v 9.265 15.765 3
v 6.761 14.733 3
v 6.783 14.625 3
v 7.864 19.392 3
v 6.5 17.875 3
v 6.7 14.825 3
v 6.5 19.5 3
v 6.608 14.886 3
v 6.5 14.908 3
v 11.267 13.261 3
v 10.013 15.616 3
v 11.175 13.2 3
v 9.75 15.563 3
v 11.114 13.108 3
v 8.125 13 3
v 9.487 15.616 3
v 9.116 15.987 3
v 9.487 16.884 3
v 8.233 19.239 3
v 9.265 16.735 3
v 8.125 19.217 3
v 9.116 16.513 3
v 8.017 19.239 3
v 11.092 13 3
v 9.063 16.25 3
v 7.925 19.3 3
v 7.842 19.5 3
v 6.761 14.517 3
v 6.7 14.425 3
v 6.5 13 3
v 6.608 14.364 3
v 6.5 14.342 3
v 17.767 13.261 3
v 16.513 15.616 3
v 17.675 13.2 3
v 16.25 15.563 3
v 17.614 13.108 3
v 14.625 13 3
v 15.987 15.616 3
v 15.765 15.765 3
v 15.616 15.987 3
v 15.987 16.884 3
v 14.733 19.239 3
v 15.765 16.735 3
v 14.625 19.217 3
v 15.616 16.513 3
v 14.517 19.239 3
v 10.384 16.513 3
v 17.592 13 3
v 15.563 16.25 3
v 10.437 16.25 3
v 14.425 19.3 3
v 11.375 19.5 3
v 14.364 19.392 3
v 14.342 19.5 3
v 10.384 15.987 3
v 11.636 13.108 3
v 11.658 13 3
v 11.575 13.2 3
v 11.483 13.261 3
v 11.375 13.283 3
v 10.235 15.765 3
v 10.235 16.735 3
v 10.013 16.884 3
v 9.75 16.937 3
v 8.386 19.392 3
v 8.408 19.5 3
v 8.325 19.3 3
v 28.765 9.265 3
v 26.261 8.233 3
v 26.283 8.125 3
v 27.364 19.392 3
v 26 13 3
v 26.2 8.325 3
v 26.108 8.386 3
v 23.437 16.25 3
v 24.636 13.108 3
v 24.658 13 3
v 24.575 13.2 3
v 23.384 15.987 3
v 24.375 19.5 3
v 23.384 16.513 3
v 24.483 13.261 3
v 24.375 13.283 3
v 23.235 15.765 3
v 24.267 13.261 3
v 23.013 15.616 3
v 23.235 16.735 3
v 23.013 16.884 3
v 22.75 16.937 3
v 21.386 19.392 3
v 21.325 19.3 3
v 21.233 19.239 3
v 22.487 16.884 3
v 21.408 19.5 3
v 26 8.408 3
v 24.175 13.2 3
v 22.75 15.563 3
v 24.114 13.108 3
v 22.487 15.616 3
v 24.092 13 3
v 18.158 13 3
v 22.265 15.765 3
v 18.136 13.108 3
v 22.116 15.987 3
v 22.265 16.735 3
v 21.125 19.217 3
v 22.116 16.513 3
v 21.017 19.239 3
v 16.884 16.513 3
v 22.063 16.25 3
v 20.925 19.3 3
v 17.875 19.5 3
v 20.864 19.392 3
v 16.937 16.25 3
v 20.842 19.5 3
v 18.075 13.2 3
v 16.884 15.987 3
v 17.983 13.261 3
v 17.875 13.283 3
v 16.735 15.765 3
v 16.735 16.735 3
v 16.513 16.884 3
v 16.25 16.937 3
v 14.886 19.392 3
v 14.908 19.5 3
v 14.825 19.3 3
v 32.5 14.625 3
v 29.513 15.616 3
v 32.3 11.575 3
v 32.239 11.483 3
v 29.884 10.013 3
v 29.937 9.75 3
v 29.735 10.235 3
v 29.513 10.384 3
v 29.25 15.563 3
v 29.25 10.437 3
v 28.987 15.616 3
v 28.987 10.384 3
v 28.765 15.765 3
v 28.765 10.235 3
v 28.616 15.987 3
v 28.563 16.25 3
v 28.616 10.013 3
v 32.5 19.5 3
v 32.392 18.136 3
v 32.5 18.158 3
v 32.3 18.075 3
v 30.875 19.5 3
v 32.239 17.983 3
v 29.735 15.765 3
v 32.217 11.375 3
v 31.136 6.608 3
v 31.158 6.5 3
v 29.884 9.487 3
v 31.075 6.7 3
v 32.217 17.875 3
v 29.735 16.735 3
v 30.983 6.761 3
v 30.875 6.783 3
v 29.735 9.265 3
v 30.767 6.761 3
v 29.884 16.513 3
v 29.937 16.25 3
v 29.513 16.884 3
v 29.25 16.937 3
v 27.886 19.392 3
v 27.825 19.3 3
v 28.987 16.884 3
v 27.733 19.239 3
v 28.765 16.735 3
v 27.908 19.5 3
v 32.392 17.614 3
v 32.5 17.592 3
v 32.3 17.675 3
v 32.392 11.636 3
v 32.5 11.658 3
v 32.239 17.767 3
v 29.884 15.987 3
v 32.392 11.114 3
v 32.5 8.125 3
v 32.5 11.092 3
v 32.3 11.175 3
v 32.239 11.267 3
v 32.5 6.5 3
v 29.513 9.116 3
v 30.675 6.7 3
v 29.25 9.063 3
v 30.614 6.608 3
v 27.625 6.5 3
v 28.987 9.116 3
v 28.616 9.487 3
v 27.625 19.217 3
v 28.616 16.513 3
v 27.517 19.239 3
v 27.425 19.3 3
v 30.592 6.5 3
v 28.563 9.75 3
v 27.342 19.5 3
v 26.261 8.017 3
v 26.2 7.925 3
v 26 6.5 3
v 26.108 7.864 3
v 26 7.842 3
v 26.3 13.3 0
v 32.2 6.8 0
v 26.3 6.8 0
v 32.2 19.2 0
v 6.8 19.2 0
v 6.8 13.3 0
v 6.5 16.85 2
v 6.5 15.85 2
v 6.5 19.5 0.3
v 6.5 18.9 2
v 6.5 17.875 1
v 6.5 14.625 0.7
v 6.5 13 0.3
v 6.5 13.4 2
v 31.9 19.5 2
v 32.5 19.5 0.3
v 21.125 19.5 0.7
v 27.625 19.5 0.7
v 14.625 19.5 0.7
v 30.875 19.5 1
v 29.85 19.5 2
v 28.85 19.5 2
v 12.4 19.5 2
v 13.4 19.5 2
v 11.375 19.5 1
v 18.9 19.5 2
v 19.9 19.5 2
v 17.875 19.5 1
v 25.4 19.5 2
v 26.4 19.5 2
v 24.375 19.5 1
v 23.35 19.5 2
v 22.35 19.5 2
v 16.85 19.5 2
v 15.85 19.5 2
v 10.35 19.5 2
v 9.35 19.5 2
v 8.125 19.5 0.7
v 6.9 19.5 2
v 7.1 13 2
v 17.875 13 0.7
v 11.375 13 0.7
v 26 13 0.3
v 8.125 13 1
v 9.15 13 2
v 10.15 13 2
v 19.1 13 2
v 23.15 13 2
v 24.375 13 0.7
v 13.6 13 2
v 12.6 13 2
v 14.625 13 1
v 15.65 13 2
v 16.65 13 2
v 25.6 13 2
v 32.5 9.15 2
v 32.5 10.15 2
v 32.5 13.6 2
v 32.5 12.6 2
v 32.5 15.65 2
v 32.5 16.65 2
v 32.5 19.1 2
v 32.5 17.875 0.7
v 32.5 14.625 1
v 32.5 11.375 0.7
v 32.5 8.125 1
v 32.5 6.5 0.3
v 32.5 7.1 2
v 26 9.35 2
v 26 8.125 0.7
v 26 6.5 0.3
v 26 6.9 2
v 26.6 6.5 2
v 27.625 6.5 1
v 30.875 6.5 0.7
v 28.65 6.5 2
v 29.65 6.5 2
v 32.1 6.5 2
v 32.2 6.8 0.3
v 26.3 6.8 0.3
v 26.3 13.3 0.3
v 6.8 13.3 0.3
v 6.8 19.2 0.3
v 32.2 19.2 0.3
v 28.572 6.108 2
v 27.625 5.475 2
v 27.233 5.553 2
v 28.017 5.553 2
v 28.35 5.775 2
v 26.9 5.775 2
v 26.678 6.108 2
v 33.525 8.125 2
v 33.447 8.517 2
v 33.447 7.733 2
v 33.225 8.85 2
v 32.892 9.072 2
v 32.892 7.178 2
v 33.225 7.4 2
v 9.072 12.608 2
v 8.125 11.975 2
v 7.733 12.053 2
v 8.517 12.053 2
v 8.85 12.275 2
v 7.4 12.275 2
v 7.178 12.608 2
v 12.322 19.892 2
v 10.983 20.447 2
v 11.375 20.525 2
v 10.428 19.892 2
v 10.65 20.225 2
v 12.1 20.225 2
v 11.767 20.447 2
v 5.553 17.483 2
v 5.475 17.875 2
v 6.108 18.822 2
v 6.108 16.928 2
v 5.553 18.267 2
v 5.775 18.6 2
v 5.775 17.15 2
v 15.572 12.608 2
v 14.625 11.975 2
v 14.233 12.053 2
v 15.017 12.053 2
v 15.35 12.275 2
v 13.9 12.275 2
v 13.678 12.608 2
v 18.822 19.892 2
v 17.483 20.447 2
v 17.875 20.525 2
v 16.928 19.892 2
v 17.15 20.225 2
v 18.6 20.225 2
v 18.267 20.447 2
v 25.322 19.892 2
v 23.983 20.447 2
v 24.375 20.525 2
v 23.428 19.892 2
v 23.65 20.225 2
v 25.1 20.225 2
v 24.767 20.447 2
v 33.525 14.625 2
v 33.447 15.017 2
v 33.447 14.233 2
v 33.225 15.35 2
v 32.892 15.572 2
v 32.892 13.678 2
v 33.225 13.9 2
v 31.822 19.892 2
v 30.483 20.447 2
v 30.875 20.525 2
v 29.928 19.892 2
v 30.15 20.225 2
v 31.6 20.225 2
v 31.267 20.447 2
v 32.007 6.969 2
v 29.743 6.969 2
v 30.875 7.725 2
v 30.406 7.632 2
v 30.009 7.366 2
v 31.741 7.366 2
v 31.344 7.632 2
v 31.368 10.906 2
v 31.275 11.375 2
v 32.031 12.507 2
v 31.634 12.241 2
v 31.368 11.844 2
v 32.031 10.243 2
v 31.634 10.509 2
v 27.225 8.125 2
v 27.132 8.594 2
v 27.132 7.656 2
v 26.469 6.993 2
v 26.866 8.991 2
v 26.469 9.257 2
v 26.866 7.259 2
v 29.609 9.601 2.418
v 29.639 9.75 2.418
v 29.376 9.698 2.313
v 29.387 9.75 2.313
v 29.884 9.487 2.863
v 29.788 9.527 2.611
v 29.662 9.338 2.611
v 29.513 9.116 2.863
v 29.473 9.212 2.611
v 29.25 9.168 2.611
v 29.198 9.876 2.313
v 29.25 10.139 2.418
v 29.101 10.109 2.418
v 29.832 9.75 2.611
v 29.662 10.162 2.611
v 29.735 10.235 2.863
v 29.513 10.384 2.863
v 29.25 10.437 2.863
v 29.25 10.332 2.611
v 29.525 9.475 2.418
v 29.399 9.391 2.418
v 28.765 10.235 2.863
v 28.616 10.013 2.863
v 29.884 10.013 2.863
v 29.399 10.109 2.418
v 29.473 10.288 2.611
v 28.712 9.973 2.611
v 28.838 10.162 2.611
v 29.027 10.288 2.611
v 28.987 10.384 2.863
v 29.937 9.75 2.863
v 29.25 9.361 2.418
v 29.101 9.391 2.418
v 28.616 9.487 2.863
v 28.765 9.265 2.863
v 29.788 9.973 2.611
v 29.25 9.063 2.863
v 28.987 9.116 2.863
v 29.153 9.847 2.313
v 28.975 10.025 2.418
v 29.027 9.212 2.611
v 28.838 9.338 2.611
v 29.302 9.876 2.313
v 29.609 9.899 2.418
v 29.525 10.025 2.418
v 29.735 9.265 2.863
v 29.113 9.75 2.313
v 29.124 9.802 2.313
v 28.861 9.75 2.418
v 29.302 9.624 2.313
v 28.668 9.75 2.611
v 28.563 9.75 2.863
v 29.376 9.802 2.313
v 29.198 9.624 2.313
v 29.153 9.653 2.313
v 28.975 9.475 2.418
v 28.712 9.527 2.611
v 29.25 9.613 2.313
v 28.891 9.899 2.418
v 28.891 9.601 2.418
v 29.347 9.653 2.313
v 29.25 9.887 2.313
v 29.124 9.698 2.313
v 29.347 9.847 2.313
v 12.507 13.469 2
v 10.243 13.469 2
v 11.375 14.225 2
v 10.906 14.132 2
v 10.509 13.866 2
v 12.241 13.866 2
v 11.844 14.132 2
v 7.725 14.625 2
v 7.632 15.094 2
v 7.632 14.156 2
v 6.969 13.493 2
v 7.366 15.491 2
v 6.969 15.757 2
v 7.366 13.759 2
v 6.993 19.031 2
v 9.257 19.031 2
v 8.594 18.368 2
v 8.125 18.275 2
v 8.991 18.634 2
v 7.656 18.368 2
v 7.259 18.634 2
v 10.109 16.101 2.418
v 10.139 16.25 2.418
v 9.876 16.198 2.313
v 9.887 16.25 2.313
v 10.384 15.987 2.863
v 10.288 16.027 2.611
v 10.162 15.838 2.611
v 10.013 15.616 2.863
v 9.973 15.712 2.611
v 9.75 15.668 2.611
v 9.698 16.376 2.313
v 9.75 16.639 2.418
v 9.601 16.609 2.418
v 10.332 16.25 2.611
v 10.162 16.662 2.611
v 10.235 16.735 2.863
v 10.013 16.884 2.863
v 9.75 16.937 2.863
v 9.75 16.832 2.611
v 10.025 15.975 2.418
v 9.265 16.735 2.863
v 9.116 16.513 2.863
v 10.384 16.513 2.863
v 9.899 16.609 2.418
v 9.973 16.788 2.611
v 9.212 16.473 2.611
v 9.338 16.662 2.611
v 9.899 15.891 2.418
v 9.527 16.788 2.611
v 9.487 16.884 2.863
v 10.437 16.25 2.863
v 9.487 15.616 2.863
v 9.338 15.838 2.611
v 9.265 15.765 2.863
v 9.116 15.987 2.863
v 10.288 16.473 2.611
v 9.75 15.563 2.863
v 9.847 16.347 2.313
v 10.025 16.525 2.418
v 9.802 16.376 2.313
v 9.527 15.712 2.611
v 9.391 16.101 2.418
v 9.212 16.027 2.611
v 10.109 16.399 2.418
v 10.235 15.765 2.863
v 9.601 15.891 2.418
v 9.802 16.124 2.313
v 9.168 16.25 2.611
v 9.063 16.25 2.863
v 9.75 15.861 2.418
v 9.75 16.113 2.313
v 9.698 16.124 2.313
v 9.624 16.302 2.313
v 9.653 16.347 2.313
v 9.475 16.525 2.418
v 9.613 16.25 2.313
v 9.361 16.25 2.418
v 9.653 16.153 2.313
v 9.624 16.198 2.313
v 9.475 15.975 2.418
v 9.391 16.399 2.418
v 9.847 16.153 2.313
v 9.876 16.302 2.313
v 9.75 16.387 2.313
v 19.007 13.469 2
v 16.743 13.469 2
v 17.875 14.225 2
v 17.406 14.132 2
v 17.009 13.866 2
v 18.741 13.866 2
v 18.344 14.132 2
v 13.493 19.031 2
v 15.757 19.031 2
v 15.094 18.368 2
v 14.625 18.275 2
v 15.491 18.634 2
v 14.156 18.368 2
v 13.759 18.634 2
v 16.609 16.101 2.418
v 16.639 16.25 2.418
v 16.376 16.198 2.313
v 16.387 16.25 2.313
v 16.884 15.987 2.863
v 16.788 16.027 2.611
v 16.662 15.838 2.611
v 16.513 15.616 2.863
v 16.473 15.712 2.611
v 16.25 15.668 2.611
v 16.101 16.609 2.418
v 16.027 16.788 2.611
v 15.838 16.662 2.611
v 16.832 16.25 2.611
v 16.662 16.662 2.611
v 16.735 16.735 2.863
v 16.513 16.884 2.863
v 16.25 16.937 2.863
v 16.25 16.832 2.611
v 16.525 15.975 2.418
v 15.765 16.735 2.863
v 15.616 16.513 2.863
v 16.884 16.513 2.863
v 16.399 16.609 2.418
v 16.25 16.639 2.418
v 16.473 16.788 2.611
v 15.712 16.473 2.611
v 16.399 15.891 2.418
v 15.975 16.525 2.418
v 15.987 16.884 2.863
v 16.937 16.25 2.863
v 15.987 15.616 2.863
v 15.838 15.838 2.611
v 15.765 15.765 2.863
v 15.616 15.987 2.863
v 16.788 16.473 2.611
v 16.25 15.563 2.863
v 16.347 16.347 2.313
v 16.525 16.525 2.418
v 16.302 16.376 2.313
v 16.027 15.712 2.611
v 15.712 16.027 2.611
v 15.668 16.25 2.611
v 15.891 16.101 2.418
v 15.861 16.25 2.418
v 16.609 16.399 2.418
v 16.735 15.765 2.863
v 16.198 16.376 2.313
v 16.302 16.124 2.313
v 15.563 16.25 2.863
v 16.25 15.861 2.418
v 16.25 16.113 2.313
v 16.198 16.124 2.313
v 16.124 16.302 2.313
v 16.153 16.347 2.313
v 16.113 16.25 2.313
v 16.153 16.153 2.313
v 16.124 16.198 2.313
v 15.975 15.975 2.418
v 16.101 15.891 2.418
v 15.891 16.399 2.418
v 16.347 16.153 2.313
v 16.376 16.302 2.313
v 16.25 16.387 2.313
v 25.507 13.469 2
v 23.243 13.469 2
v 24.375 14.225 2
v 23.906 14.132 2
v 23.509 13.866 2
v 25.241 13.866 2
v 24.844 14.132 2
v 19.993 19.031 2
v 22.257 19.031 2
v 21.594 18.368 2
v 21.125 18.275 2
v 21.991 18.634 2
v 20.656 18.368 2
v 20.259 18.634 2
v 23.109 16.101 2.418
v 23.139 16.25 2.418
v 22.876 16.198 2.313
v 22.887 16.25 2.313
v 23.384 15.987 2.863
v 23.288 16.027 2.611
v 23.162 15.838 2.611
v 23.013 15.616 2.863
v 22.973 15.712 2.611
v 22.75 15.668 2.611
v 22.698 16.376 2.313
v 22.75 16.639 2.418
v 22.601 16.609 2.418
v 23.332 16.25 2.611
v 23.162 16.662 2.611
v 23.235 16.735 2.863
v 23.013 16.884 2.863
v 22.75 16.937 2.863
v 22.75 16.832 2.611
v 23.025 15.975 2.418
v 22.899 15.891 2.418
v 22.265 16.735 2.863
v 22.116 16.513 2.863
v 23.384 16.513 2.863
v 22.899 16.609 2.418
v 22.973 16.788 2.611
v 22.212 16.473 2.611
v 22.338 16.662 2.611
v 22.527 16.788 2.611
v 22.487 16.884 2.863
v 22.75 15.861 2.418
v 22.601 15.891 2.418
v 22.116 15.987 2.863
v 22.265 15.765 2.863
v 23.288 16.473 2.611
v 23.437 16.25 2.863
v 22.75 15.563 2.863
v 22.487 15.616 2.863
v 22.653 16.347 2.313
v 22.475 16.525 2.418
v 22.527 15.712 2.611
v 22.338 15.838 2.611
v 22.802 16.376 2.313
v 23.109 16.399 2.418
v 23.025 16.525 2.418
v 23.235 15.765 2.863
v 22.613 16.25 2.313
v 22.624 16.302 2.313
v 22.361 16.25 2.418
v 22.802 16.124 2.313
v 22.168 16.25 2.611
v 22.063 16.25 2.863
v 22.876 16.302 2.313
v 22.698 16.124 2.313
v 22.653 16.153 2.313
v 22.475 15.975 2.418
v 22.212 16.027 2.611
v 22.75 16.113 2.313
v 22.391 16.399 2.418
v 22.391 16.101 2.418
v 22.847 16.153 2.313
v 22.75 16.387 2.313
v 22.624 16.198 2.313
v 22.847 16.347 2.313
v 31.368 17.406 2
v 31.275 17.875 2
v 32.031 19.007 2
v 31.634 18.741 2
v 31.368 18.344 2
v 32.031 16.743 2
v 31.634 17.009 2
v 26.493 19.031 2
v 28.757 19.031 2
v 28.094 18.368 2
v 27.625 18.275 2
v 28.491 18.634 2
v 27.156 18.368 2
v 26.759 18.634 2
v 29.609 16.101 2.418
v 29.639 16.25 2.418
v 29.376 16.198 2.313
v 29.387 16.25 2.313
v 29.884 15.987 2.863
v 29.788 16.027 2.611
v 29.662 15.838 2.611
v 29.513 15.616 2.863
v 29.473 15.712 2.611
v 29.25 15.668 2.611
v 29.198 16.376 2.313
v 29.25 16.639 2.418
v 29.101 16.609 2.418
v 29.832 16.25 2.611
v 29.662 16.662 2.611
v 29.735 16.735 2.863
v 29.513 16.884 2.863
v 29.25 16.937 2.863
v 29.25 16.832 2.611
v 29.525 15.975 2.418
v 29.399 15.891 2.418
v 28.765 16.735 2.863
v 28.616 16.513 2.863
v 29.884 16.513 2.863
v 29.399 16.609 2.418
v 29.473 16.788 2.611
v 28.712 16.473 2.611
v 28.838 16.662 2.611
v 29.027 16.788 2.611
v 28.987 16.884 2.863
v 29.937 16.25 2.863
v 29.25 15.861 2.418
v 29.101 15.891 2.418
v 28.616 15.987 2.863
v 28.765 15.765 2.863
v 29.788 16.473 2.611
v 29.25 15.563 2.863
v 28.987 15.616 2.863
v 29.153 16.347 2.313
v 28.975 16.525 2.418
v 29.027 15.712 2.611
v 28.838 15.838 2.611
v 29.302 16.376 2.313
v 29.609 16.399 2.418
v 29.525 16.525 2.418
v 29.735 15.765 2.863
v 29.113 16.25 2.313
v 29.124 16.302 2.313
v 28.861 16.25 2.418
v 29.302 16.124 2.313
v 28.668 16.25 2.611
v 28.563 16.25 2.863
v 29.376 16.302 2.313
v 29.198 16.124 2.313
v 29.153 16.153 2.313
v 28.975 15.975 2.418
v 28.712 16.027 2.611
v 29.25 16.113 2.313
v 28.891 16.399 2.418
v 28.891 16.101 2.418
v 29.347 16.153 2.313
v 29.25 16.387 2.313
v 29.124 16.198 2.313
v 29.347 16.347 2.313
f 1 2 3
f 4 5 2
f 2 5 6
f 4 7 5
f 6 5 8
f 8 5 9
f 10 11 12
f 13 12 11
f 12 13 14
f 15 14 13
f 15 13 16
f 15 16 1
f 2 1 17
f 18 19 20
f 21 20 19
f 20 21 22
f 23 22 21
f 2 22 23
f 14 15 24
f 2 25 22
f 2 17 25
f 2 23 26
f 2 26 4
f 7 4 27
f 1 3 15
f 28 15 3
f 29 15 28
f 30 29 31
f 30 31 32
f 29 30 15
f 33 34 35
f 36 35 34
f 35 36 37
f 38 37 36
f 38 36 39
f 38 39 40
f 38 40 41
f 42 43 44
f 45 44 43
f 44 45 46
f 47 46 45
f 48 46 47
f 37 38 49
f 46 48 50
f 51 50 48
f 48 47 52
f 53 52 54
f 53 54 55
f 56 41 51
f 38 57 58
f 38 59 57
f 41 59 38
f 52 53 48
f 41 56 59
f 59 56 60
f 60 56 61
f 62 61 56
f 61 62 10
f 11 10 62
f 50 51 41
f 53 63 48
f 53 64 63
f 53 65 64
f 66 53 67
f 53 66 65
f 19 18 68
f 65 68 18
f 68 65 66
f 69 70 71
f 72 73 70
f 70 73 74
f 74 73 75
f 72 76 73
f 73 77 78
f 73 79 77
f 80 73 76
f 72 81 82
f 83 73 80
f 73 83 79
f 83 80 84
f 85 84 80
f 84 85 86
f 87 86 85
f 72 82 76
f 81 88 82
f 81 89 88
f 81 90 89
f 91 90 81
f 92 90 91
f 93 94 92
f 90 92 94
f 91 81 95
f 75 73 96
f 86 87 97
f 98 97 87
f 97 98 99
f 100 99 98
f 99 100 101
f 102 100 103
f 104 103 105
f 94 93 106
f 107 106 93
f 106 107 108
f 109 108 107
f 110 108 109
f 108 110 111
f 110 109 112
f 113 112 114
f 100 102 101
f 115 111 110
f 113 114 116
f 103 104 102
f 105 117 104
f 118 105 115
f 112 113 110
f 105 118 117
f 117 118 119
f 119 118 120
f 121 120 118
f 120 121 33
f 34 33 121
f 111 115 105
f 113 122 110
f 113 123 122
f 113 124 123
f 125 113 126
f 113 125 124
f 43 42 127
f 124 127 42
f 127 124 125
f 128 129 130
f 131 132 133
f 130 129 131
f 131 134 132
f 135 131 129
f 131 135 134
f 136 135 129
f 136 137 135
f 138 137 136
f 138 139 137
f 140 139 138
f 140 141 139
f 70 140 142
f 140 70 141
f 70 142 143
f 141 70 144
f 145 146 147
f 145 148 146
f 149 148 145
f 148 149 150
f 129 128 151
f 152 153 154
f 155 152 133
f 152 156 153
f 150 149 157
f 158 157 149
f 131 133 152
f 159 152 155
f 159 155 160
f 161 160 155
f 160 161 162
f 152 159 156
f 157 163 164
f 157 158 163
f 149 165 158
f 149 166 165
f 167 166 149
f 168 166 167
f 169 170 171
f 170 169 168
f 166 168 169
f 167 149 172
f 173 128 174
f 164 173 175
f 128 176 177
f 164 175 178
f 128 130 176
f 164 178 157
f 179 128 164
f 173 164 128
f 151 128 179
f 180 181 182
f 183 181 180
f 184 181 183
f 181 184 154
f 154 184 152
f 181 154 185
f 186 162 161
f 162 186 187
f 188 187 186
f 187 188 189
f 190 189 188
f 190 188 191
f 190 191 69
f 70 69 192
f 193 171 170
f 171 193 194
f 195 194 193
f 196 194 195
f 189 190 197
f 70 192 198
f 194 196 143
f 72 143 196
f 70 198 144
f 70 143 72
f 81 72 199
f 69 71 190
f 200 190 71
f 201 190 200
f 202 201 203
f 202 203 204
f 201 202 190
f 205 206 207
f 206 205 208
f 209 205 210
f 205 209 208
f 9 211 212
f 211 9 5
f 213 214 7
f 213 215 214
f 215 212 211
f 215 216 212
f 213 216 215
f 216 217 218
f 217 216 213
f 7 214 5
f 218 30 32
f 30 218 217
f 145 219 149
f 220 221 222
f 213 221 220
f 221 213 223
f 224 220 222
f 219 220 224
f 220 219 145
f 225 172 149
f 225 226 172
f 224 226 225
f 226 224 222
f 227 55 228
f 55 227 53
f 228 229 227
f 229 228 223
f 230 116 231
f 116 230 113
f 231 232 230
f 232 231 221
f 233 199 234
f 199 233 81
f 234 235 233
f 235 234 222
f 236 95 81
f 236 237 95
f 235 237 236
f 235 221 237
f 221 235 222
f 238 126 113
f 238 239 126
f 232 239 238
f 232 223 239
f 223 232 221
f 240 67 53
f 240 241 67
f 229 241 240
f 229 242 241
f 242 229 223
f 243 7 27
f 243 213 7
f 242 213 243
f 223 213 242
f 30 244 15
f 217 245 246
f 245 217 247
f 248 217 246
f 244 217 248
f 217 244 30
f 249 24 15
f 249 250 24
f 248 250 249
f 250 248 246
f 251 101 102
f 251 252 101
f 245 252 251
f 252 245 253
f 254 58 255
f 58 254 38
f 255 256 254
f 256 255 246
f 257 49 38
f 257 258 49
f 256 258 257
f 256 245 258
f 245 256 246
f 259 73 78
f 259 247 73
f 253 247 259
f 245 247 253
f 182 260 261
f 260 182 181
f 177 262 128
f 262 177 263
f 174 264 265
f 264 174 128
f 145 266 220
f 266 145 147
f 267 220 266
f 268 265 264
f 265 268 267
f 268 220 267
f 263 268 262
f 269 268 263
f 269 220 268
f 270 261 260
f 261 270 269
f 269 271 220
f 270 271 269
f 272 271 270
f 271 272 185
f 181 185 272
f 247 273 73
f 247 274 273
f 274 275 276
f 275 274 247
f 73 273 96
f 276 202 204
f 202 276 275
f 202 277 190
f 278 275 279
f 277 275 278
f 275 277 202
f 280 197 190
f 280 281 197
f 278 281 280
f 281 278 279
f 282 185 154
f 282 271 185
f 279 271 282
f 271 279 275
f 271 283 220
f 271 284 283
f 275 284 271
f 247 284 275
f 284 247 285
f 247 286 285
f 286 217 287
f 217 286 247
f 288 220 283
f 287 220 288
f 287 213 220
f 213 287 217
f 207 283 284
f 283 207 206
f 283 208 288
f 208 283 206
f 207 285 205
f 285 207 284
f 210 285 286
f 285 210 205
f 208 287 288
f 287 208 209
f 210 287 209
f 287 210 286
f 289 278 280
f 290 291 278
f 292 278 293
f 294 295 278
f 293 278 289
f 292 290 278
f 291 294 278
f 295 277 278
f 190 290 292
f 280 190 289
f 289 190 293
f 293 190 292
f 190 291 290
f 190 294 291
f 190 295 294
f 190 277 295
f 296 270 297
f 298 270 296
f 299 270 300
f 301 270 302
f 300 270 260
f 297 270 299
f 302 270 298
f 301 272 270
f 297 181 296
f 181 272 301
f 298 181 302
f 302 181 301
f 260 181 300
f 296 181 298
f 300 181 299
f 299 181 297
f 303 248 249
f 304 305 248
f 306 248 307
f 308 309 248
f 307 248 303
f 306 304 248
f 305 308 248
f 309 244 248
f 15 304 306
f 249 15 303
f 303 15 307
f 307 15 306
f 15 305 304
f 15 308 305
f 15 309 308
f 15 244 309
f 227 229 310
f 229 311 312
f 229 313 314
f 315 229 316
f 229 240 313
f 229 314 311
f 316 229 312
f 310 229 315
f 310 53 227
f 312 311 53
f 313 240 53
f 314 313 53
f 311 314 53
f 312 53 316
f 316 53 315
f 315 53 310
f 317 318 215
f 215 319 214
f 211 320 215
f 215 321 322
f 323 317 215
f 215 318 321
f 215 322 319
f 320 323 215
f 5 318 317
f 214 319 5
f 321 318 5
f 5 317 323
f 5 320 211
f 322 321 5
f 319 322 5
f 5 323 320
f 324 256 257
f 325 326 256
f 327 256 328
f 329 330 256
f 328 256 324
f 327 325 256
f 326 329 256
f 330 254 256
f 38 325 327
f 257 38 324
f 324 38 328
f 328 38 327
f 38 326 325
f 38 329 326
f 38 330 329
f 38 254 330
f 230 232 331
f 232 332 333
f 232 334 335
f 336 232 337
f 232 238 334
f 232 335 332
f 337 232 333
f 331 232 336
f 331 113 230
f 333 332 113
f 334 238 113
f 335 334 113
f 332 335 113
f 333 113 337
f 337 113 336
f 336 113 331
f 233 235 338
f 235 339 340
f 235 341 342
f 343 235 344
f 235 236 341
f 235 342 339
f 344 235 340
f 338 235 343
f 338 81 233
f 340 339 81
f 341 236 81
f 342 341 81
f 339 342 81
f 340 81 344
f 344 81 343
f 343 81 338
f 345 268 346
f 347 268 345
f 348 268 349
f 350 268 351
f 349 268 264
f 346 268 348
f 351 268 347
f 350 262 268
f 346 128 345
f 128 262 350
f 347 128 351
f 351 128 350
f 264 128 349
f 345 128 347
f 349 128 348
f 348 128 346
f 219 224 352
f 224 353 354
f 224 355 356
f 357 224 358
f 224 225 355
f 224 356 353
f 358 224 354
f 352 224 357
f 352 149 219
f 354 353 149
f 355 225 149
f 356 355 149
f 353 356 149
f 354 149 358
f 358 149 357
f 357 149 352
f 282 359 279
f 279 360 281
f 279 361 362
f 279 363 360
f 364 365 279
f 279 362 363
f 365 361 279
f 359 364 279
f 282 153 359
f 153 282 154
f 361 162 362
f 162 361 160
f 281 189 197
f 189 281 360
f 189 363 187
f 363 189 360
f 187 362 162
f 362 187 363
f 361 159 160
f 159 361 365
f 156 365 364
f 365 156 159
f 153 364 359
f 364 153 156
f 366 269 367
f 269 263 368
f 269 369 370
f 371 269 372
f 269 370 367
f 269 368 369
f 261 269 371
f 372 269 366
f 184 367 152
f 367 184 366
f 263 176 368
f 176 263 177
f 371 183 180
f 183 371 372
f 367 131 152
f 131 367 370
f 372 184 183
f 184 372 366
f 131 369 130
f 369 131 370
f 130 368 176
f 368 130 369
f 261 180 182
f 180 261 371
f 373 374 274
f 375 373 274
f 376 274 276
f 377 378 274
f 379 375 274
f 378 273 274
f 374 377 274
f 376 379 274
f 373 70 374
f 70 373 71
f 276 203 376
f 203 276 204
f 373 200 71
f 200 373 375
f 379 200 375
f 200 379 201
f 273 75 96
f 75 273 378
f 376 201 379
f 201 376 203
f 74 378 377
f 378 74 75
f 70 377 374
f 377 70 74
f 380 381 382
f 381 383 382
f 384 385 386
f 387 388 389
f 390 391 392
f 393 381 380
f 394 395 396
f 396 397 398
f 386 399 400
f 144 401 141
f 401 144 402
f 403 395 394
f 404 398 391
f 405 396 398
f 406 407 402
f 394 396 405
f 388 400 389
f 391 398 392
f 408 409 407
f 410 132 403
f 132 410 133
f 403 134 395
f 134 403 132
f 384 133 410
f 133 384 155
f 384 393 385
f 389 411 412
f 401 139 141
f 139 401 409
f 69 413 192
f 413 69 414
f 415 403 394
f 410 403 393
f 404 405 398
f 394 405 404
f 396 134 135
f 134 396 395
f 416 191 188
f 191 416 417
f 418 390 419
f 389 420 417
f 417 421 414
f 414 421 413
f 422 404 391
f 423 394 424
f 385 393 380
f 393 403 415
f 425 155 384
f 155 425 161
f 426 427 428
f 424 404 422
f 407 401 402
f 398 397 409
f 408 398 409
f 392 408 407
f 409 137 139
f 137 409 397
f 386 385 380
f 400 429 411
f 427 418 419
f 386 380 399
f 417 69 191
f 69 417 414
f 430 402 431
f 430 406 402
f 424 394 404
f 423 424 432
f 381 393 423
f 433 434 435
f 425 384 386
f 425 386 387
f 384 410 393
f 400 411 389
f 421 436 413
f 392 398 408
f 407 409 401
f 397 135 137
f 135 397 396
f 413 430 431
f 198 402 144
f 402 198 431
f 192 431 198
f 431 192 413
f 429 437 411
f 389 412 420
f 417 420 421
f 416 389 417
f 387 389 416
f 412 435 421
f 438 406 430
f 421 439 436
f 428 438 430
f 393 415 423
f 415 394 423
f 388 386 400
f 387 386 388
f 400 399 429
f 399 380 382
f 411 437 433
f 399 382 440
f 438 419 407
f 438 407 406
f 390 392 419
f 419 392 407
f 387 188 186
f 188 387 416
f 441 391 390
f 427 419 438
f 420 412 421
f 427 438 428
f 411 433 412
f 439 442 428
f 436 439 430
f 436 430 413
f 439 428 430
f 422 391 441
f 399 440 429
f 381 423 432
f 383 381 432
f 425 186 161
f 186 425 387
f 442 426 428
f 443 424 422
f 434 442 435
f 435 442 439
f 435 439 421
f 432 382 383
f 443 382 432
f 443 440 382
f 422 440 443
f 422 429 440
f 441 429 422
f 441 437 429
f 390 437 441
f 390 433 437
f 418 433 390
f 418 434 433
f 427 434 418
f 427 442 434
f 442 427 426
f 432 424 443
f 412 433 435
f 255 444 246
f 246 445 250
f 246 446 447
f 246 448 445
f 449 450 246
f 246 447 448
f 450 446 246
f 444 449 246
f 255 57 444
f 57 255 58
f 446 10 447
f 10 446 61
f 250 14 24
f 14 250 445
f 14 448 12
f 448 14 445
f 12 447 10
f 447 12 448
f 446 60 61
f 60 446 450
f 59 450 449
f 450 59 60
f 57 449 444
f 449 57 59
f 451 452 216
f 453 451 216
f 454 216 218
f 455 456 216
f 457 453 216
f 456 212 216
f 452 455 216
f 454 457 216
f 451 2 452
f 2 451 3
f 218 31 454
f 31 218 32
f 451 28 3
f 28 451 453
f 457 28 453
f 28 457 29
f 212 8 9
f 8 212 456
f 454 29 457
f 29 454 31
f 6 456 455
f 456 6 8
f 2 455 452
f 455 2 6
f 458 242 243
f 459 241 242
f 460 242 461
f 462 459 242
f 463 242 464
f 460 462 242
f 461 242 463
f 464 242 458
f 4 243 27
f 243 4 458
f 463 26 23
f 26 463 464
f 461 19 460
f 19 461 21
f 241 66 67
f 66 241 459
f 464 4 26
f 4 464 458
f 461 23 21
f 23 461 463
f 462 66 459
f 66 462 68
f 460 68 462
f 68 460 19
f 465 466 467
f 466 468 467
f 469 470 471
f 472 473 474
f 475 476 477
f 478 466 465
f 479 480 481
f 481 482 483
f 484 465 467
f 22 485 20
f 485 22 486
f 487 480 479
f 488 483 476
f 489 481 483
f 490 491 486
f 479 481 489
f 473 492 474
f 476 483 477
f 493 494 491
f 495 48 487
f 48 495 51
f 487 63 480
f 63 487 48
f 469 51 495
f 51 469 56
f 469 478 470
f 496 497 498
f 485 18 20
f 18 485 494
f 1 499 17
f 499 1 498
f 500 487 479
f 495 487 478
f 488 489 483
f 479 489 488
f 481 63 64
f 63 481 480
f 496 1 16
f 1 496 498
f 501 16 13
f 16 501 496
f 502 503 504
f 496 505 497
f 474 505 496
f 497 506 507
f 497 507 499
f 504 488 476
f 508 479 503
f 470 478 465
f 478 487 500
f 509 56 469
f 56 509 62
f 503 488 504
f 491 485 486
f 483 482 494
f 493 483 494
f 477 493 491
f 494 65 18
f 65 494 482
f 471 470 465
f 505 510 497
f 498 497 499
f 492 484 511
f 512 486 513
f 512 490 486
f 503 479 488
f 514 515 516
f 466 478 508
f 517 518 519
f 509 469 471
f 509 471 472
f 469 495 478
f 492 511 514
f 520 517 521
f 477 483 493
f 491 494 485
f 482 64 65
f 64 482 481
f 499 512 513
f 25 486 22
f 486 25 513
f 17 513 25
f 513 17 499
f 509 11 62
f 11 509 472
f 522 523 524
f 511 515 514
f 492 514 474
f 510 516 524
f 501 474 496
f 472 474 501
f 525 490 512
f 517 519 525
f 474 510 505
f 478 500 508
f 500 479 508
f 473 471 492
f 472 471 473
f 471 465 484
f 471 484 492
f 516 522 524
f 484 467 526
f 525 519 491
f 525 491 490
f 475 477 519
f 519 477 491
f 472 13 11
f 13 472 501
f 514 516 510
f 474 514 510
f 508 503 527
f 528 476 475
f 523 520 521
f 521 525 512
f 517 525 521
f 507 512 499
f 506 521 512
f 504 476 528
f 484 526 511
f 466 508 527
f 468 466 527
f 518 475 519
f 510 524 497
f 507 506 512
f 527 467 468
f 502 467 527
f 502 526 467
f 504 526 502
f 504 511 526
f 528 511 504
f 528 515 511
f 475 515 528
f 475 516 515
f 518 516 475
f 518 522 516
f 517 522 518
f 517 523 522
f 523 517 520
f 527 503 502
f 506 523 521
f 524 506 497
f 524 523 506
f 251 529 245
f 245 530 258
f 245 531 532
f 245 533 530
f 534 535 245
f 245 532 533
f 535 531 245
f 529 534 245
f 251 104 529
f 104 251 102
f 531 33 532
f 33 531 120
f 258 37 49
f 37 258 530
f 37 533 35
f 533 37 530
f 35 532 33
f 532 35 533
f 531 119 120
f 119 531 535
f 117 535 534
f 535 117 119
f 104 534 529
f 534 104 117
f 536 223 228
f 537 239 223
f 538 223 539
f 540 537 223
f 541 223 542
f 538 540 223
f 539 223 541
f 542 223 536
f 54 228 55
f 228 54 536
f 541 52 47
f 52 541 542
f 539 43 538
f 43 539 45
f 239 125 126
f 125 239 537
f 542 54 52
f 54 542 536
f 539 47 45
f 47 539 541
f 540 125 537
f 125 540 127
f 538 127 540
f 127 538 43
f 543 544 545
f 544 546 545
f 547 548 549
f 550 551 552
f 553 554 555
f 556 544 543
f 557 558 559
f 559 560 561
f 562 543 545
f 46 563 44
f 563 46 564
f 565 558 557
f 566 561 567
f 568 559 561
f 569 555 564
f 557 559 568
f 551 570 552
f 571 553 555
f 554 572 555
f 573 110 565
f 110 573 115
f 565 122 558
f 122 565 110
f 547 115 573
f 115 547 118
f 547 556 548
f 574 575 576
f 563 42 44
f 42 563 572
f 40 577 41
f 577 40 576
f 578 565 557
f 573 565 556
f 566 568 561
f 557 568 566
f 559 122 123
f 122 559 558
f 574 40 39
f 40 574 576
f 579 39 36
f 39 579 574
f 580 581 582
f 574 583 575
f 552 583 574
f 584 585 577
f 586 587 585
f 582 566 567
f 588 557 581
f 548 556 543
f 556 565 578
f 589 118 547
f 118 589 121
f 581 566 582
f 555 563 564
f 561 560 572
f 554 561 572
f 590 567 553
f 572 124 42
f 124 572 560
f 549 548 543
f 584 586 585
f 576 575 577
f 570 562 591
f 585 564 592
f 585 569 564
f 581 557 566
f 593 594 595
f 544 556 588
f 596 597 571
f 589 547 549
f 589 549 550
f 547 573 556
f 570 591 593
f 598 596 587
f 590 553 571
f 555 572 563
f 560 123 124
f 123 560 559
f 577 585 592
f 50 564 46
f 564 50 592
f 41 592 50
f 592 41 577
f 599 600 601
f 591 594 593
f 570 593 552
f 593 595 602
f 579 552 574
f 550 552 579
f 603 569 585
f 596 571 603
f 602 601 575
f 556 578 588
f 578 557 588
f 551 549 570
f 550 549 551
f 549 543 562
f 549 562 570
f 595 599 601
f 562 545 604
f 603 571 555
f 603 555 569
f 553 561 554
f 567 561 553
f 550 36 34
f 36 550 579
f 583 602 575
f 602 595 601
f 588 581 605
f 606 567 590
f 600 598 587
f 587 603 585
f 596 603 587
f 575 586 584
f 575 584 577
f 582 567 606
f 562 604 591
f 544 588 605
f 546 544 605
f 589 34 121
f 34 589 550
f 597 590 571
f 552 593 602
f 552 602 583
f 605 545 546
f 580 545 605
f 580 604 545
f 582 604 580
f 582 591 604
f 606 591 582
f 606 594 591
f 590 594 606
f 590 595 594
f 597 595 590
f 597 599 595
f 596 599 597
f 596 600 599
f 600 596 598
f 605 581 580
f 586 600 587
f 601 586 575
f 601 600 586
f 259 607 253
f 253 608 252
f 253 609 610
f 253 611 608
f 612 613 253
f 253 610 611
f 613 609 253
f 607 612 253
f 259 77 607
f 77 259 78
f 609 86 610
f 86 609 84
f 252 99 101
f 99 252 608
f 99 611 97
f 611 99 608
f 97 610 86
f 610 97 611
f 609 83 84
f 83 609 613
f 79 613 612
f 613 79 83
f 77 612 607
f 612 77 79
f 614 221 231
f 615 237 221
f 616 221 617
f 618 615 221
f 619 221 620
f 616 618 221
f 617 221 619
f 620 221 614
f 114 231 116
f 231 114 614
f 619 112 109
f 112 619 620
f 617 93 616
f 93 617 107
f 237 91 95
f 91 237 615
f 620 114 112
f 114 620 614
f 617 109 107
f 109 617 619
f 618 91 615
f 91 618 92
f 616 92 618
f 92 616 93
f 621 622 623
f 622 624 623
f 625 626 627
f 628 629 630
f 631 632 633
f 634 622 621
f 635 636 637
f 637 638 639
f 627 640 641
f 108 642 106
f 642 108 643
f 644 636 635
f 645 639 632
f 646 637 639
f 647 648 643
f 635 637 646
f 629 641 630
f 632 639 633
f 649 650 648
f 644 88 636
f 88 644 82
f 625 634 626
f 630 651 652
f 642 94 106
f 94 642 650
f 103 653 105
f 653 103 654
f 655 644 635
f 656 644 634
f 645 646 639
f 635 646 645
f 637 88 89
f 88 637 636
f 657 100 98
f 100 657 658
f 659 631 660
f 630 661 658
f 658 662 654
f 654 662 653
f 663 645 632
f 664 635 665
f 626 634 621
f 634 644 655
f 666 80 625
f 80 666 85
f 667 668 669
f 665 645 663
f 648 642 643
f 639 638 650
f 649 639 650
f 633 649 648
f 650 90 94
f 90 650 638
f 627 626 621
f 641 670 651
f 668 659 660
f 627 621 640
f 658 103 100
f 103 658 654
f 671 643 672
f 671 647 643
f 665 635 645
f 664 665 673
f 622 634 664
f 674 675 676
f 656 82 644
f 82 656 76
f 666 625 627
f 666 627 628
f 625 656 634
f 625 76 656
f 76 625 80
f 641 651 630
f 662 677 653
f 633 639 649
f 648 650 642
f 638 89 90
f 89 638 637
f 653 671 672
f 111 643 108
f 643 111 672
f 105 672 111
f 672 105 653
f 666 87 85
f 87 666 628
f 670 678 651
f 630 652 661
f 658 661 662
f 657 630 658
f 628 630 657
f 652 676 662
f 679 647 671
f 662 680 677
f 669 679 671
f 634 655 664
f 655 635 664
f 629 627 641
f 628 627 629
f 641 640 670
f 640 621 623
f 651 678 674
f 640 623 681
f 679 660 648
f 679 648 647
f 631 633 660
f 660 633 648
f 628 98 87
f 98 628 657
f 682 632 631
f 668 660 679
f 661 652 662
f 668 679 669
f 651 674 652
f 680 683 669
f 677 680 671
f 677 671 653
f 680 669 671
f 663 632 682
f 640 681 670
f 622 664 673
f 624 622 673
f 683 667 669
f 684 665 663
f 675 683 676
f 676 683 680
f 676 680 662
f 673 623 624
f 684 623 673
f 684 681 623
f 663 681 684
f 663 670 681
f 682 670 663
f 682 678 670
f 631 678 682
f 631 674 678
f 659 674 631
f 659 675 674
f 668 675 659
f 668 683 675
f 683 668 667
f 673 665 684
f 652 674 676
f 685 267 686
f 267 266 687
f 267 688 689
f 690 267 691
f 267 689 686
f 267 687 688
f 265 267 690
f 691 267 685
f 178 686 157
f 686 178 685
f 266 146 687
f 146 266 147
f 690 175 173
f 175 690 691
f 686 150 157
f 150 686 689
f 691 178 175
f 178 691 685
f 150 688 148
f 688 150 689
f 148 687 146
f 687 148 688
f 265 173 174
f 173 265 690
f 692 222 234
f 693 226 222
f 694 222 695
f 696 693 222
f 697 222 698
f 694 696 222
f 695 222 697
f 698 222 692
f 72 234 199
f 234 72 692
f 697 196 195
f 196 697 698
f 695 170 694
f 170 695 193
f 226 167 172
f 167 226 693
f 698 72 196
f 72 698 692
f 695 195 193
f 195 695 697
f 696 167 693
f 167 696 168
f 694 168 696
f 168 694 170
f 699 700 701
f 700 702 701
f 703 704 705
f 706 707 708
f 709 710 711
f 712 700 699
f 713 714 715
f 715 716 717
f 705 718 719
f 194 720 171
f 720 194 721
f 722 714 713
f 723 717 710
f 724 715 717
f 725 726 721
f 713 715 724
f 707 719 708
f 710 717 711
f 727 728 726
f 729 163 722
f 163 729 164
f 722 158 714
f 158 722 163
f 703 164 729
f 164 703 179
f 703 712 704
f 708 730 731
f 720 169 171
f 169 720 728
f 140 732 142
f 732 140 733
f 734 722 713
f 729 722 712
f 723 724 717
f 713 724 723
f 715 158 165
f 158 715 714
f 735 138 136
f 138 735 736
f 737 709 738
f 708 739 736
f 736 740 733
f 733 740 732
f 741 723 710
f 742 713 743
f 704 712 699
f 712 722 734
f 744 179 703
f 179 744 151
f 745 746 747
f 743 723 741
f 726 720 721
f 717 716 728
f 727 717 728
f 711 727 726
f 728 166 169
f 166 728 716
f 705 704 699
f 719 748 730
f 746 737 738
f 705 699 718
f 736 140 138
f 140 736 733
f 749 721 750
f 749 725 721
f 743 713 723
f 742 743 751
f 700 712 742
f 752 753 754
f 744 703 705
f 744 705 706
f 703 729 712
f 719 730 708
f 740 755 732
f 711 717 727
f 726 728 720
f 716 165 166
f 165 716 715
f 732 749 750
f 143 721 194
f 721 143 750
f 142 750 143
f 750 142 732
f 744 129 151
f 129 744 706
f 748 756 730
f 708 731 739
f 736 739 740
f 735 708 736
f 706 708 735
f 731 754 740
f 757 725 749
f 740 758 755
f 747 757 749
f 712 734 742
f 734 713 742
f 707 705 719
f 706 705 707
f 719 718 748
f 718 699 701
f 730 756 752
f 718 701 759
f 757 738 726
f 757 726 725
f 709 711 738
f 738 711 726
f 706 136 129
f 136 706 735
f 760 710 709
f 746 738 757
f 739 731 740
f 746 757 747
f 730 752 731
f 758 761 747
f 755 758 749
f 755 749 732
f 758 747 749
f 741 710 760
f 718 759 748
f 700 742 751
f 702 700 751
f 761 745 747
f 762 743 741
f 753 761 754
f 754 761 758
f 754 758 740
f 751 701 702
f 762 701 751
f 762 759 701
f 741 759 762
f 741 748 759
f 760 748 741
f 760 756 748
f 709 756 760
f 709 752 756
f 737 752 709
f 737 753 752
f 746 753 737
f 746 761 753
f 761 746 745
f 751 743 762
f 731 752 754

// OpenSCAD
/*
PENTOMINO BLOCKS GENERATOR
==========================
(C) 2017 by Pascal Bauermeister.

(This is a part of the project "Pentomino Belt Buckle", focused on the
Pentomino pieces. It can however be used standalone. The other parts, not in this
file, include: frame, belt clip.)

This OpenSCAD script generates Pentomino blocks, with tabs and cavities to
allow them to hold together.

Being completely parametric allows individual control such as:
- size and thickness,
- tolerances (important for 3D printing), and also
- creating any kind of pieces, including 2D Polyminos of N cells for any N.

This is freeware. Enjoy and modify freely. You may kindly mention this project.
*/

IS_INV = 1;

$fn = 24; // 24: high quality; 8: draft
//$fn = 8;
$fn = 16;

// BASE ETCHING
// this etches the first layer, to compensate for being wider due to being squished down
BASE_HEIGHT = 0.3;
BASE_TOLERANCE = 0.3;

// BLOCK
BLOCK_TOLERANCE = 0.15; // in mm
BLOCK_TOLERANCE = 0.00; // in mm

BLOCK_SIDE = 6.5;       // in mm
BLOCK_HEIGHT = 3;     // in mm

// GRIP
GRIP_TOLERANCE_H = 0.6; // in mm -- horizontal tolerance around grips; 
                        // more means smaller grip
GRIP_TOLERANCE_V = 0.3; // in mm -- vertical tolerance around grips;
                        // affects cavity height
GRIP_RADIUS = BLOCK_SIDE/4 - GRIP_TOLERANCE_H; // in mm
GRIP_HEIGHT = 1;      // in mm
GRIP_RADIUS2 = BLOCK_TOLERANCE;
GRIP_V_OFFSET = IS_INV ? -0.5 : 0.5;

// CAVITY
CAVITY_MARGIN = 0.4; // in mm -- For cavity to not take whole half-side and leave margin on the corner
CAVITY_RADIUS = BLOCK_SIDE/4 - CAVITY_MARGIN; // in mm
CAVITY_HEIGHT = GRIP_HEIGHT + GRIP_TOLERANCE_V; // in mm
CAVITY_RADIUS2 = BLOCK_TOLERANCE;
CAVITY_DISP = BLOCK_TOLERANCE * 2;

CAVITY_RADIUS3 = 0.7;

// MISC
ATOM = 0.0001; // a tiny value just to produce some offsets, making the 
               // results nicer in preview mode by cancelling effects of
               // boolean operations, but meant to not affect the end result
               // noticeably
_ = 0;

///////////////////////////////////////////////////////////////////////////////
// Bitmap defining the Pentomino shapes
GRID = [
    [_, _, _, _, _, _, _, _, _, _, _, _, _, _, _, _, _],
    [_, 1, 1, 1, 1, _, _, 1, _, 1, 1, 1, _, _, _, _, _],
    [_, _, _, 1, _, _, _, 1, _, 1, _, _, _, 1, _, _, _],
    [_, _, _, _, _, _, _, 1, _, 1, _, 1, 1, 1, _, _, _], 
    [_, 1, 1, _, _, _, _, 1, _, _, _, _, 1, _, _, 1, _],
    [_, 1, _, _, _, 1, _, 1, _, _, _, _, _, _, _, 1, _],
    [_, 1, _, 1, 1, 1, _, _, _, 1, _, _, _, _, 1, 1, _],
    [_, 1, _, 1, _, _, _, _, 1, 1, 1, _, _, _, 1, _, _],
    [_, _, _, _, _, _, _, _, _, 1, _, _, _, _, _, _, _],
    [_, _, _, 1, _, _, 1, _, _, _, _, _, _, _, 1, _, _],
    [_, _, 1, 1, _, _, 1, _, _, 1, _, 1, _, 1, 1, _, _],
    [_, 1, 1, _, _, 1, 1, 1, _, 1, 1, 1, _, 1, 1, _, _],
    [_, _, _, _, _, _, _, _, _, _, _, _, _, _, _, _, _],

//    // Chiral copies
//    [_, _, _, _, _, _, _, _, _, _, _, _, _, _, _, _, _],
//    [_, 1, 1, 1, 1, _, 1, _, _, _, 1, 1, 1, 1, _, _, _],
//    [_, _, 1, _, _, _, 1, 1, 1, _, 1, _, _, _, _, _, _],
//    [_, _, _, _, _, _, _, 1, _, _, _, _, _, 1, _, _, _],
//    [_, _, _, 1, 1, _, _, _, _, _, 1, 1, _, 1, 1, 1, _],
//    [_, 1, 1, 1, _, _, _, _, _, 1, 1, 1, _, _, _, 1, _],
    [_, _, _, _, _, _, _, _, _, _, _, _, _, _, _, _, _],
];


GRID = [
    [_, _, _, _, _, _, _, _, _, _, _, _, _, _, _, _, _],
    [_, _, _, _, _, _, _, _, _, 1, 1, 1, _, _, _, _, _],
    [_, _, _, _, _, _, _, _, _, 1, _, _, _, 1, _, _, _],
    [_, _, _, _, _, _, _, _, _, 1, _, 1, 1, 1, _, _, _], 
    [_, 1, 1, _, _, _, _, _, _, _, _, _, 1, _, _, 1, _],
    [_, 1, _, _, _, 1, _, _, _, _, _, _, _, _, _, 1, _],
    [_, 1, _, 1, 1, 1, _, _, _, 1, _, _, _, _, 1, 1, _],
    [_, 1, _, 1, _, _, _, _, 1, 1, 1, _, _, _, 1, _, _],
    [_, _, _, _, _, _, _, _, _, 1, _, _, _, _, _, _, _],
    [_, _, _, 1, _, _, 1, _, _, _, _, _, _, _, 1, _, _],
    [_, _, 1, 1, _, _, 1, _, _, 1, _, 1, _, 1, 1, _, _],
    [_, 1, 1, _, _, 1, 1, 1, _, 1, 1, 1, _, 1, 1, _, _],
    [_, _, _, _, _, _, _, _, _, _, _, _, _, _, _, _, _],

];

// Rename as GRID to have a single block, for tests
GRID = [
    [_, _, _, _, _, _, _],
    [_, _, _, _, 1, _, _],
    [_, 1, 1, 1, 1, _, _],
    [_, _, _, _, _, _, _],
    [_, _, _, _, _, _, _],
];

///////////////////////////////////////////////////////////////////////////////
// Side-level primitives

/* Generate a grip for one give side (to be added) */
module make_grip_side(x, y, side) {
    convex = (side=="n") ? GRID[y+1][x-1] || GRID[y+1][x+1] :
             (side=="s") ? GRID[y-1][x-1] || GRID[y-1][x+1] :
             (side=="e") ? GRID[y+1][x+1] || GRID[y-1][x+1] :
           /*(side=="w")*/ GRID[y+1][x-1] || GRID[y-1][x-1];
    if (!convex) {
        center = (side=="n") ? [BLOCK_SIDE*.75, BLOCK_SIDE -BLOCK_TOLERANCE*2, 0] :
                 (side=="s") ? [BLOCK_SIDE*.25,             BLOCK_TOLERANCE*2, 0] :
                 (side=="e") ? [BLOCK_SIDE -BLOCK_TOLERANCE*2, BLOCK_SIDE*.25, 0] :
               /*(side=="w")*/ [            BLOCK_TOLERANCE*2, BLOCK_SIDE*.75, 0] ;
        dh = (BLOCK_HEIGHT - GRIP_HEIGHT*2) / 2 - GRIP_V_OFFSET;

        color("yellow")
        translate([0, 0, dh])
        translate(center)
        cylinder(h=GRIP_HEIGHT, r2=GRIP_RADIUS, r1=GRIP_RADIUS2);

        color("yellow")
        translate([0, 0, GRIP_HEIGHT+dh])
        translate(center)
        cylinder(h=GRIP_HEIGHT, r1=GRIP_RADIUS, r2=GRIP_RADIUS2);
    }
}

/* Generate a cavity for one give side (to be substracted) */
module make_cavity_side(x, y, side) {
    // cavity for grip of neighbour piece
    center = (side=="n") ? [BLOCK_SIDE*.25, BLOCK_SIDE -CAVITY_DISP, 0] :
             (side=="s") ? [BLOCK_SIDE*.75,            +CAVITY_DISP, 0] :
             (side=="e") ? [BLOCK_SIDE -CAVITY_DISP, BLOCK_SIDE*.75, 0] :
           /*(side=="w")*/ [           +CAVITY_DISP, BLOCK_SIDE*.25, 0];    
    dh = (BLOCK_HEIGHT - CAVITY_HEIGHT*2) / 2 - GRIP_V_OFFSET;

    color("orange")
    translate([0, 0, dh])
    translate(center)
    cylinder(h=CAVITY_HEIGHT, r2=CAVITY_RADIUS, r1=CAVITY_RADIUS2);

    color("orange")
    translate([0, 0, CAVITY_HEIGHT+dh])
    translate(center)
    cylinder(h=CAVITY_HEIGHT, r1=CAVITY_RADIUS, r2=CAVITY_RADIUS2);

}

/* Generate an etching for one give side (to be substracted) */
module make_etch_side(x, y, side) {
    center = (side=="n") ? [BLOCK_SIDE/2,   BLOCK_SIDE] :
             (side=="s") ? [BLOCK_SIDE/2,            0] :
             (side=="e") ? [  BLOCK_SIDE, BLOCK_SIDE/2] :
           /*(side=="w")*/ [           0, BLOCK_SIDE/2];

    // main etiching
    qsize = (side=="n") ? [BLOCK_SIDE + BLOCK_TOLERANCE*2, BLOCK_TOLERANCE*2] :
            (side=="s") ? [BLOCK_SIDE + BLOCK_TOLERANCE*2, BLOCK_TOLERANCE*2] :
            (side=="e") ? [BLOCK_TOLERANCE*2, BLOCK_SIDE + BLOCK_TOLERANCE*2] :
          /*(side=="w")*/ [BLOCK_TOLERANCE*2, BLOCK_SIDE + BLOCK_TOLERANCE*2];
    tx = center[0] - qsize[0]/2;
    ty = center[1] - qsize[1]/2;

    color("green")
    translate([tx, ty, -ATOM])
    cube([qsize[0], qsize[1], BLOCK_HEIGHT + ATOM*2]);
    
    // base etiching
    qsize2 = (side=="n") ? [BLOCK_SIDE + BLOCK_TOLERANCE*2 + BASE_TOLERANCE*2, BLOCK_TOLERANCE*2 + BASE_TOLERANCE*2] :
             (side=="s") ? [BLOCK_SIDE + BLOCK_TOLERANCE*2 + BASE_TOLERANCE*2, BLOCK_TOLERANCE*2 + BASE_TOLERANCE*2] :
             (side=="e") ? [BLOCK_TOLERANCE*2 + BASE_TOLERANCE*2, BLOCK_SIDE + BLOCK_TOLERANCE*2 + BASE_TOLERANCE*2] :
          /*(side=="w")*/ [BLOCK_TOLERANCE*2 + BASE_TOLERANCE*2, BLOCK_SIDE + BLOCK_TOLERANCE*2 + BASE_TOLERANCE*2];
    tx2 = center[0] - qsize2[0]/2;
    ty2 = center[1] - qsize2[1]/2;
    color("black")
    translate([tx2, ty2, -ATOM])
    cube([qsize2[0], qsize2[1], BASE_HEIGHT + ATOM*2]);    
}

///////////////////////////////////////////////////////////////////////////////
// Block-level primitives

/* Generate a given grid block */
module make_block(x, y) {
    if (GRID[y][x]) {
        translate([x*BLOCK_SIDE, y*BLOCK_SIDE, 0])
        cube([BLOCK_SIDE, BLOCK_SIDE, BLOCK_HEIGHT]);
    }
}

/* Generate etching for a given grid block (to be substracted) */
module make_etch(x, y) {
    if (GRID[y][x]) {
        translate([x*BLOCK_SIDE, y*BLOCK_SIDE, 0]) {
            if (!GRID[y-1][x]) make_etch_side(x, y, "s");
            if (!GRID[y+1][x]) make_etch_side(x, y, "n");
            if (!GRID[y][x+1]) make_etch_side(x, y, "e");
            if (!GRID[y][x-1]) make_etch_side(x, y, "w");
        }
    }
}

/* Generate all grips for a given grid block (to be added) */
module make_grip(x, y) {
    if (GRID[y][x]) {
        translate([x*BLOCK_SIDE, y*BLOCK_SIDE, 0]) {
            if (!GRID[y-1][x]) make_grip_side(x, y, "s");
            if (!GRID[y+1][x]) make_grip_side(x, y, "n");
            if (!GRID[y][x+1]) make_grip_side(x, y, "e");
            if (!GRID[y][x-1]) make_grip_side(x, y, "w");
        }
    }
}

/* Generate all cavities for a given grid block (to be substracted) */
module make_cavity(x, y) {
    if (GRID[y][x]) {
        translate([x*BLOCK_SIDE, y*BLOCK_SIDE, 0]) {
            if (!GRID[y-1][x]) make_cavity_side(x, y, "s");
            if (!GRID[y+1][x]) make_cavity_side(x, y, "n");
            if (!GRID[y][x+1]) make_cavity_side(x, y, "e");
            if (!GRID[y][x-1]) make_cavity_side(x, y, "w");
                
            translate([ 0.5 * BLOCK_SIDE, 0.5 * BLOCK_SIDE, BLOCK_HEIGHT*IS_INV])
            sphere(r=CAVITY_RADIUS3);
        }
    }
}

///////////////////////////////////////////////////////////////////////////////
// Grid-level primitives

/* Generate all blocks of the grid */
module make_blocks() {
    union() { for (y = [0 : len(GRID)-1] ) for (x = [0 : len(GRID[y])-1] ) make_block(x, y); }
}

/* Generate all etchings of the grid */
module make_etches() {
    union() { for (y = [0 : len(GRID)-1] ) for (x = [0 : len(GRID[y])-1] ) make_etch(x, y); }
}

/* Generate all grips of the grid */
module make_grips() {
    union() { for (y = [0 : len(GRID)-1] ) for (x = [0 : len(GRID[y])-1] ) make_grip(x, y); }
}

/* Generate all cavities of the grid */
module make_cavities() {
    union() { for (y = [0 : len(GRID)-1] ) for (x = [0 : len(GRID[y])-1] ) make_cavity(x, y); }
}

///////////////////////////////////////////////////////////////////////////////
// Everything together

/* Generate all objects by combining additive and substractive elements */
module make_all() {
    difference()
    {
        union() {
            //union() {
            difference() {
                make_blocks();
                make_etches();
            }
            make_grips();
        }
        make_cavities();
    }
}

/* Go for it and fix orientation */
rotate([0, 180*0, 90*0]) {
    make_all();
}

// End
